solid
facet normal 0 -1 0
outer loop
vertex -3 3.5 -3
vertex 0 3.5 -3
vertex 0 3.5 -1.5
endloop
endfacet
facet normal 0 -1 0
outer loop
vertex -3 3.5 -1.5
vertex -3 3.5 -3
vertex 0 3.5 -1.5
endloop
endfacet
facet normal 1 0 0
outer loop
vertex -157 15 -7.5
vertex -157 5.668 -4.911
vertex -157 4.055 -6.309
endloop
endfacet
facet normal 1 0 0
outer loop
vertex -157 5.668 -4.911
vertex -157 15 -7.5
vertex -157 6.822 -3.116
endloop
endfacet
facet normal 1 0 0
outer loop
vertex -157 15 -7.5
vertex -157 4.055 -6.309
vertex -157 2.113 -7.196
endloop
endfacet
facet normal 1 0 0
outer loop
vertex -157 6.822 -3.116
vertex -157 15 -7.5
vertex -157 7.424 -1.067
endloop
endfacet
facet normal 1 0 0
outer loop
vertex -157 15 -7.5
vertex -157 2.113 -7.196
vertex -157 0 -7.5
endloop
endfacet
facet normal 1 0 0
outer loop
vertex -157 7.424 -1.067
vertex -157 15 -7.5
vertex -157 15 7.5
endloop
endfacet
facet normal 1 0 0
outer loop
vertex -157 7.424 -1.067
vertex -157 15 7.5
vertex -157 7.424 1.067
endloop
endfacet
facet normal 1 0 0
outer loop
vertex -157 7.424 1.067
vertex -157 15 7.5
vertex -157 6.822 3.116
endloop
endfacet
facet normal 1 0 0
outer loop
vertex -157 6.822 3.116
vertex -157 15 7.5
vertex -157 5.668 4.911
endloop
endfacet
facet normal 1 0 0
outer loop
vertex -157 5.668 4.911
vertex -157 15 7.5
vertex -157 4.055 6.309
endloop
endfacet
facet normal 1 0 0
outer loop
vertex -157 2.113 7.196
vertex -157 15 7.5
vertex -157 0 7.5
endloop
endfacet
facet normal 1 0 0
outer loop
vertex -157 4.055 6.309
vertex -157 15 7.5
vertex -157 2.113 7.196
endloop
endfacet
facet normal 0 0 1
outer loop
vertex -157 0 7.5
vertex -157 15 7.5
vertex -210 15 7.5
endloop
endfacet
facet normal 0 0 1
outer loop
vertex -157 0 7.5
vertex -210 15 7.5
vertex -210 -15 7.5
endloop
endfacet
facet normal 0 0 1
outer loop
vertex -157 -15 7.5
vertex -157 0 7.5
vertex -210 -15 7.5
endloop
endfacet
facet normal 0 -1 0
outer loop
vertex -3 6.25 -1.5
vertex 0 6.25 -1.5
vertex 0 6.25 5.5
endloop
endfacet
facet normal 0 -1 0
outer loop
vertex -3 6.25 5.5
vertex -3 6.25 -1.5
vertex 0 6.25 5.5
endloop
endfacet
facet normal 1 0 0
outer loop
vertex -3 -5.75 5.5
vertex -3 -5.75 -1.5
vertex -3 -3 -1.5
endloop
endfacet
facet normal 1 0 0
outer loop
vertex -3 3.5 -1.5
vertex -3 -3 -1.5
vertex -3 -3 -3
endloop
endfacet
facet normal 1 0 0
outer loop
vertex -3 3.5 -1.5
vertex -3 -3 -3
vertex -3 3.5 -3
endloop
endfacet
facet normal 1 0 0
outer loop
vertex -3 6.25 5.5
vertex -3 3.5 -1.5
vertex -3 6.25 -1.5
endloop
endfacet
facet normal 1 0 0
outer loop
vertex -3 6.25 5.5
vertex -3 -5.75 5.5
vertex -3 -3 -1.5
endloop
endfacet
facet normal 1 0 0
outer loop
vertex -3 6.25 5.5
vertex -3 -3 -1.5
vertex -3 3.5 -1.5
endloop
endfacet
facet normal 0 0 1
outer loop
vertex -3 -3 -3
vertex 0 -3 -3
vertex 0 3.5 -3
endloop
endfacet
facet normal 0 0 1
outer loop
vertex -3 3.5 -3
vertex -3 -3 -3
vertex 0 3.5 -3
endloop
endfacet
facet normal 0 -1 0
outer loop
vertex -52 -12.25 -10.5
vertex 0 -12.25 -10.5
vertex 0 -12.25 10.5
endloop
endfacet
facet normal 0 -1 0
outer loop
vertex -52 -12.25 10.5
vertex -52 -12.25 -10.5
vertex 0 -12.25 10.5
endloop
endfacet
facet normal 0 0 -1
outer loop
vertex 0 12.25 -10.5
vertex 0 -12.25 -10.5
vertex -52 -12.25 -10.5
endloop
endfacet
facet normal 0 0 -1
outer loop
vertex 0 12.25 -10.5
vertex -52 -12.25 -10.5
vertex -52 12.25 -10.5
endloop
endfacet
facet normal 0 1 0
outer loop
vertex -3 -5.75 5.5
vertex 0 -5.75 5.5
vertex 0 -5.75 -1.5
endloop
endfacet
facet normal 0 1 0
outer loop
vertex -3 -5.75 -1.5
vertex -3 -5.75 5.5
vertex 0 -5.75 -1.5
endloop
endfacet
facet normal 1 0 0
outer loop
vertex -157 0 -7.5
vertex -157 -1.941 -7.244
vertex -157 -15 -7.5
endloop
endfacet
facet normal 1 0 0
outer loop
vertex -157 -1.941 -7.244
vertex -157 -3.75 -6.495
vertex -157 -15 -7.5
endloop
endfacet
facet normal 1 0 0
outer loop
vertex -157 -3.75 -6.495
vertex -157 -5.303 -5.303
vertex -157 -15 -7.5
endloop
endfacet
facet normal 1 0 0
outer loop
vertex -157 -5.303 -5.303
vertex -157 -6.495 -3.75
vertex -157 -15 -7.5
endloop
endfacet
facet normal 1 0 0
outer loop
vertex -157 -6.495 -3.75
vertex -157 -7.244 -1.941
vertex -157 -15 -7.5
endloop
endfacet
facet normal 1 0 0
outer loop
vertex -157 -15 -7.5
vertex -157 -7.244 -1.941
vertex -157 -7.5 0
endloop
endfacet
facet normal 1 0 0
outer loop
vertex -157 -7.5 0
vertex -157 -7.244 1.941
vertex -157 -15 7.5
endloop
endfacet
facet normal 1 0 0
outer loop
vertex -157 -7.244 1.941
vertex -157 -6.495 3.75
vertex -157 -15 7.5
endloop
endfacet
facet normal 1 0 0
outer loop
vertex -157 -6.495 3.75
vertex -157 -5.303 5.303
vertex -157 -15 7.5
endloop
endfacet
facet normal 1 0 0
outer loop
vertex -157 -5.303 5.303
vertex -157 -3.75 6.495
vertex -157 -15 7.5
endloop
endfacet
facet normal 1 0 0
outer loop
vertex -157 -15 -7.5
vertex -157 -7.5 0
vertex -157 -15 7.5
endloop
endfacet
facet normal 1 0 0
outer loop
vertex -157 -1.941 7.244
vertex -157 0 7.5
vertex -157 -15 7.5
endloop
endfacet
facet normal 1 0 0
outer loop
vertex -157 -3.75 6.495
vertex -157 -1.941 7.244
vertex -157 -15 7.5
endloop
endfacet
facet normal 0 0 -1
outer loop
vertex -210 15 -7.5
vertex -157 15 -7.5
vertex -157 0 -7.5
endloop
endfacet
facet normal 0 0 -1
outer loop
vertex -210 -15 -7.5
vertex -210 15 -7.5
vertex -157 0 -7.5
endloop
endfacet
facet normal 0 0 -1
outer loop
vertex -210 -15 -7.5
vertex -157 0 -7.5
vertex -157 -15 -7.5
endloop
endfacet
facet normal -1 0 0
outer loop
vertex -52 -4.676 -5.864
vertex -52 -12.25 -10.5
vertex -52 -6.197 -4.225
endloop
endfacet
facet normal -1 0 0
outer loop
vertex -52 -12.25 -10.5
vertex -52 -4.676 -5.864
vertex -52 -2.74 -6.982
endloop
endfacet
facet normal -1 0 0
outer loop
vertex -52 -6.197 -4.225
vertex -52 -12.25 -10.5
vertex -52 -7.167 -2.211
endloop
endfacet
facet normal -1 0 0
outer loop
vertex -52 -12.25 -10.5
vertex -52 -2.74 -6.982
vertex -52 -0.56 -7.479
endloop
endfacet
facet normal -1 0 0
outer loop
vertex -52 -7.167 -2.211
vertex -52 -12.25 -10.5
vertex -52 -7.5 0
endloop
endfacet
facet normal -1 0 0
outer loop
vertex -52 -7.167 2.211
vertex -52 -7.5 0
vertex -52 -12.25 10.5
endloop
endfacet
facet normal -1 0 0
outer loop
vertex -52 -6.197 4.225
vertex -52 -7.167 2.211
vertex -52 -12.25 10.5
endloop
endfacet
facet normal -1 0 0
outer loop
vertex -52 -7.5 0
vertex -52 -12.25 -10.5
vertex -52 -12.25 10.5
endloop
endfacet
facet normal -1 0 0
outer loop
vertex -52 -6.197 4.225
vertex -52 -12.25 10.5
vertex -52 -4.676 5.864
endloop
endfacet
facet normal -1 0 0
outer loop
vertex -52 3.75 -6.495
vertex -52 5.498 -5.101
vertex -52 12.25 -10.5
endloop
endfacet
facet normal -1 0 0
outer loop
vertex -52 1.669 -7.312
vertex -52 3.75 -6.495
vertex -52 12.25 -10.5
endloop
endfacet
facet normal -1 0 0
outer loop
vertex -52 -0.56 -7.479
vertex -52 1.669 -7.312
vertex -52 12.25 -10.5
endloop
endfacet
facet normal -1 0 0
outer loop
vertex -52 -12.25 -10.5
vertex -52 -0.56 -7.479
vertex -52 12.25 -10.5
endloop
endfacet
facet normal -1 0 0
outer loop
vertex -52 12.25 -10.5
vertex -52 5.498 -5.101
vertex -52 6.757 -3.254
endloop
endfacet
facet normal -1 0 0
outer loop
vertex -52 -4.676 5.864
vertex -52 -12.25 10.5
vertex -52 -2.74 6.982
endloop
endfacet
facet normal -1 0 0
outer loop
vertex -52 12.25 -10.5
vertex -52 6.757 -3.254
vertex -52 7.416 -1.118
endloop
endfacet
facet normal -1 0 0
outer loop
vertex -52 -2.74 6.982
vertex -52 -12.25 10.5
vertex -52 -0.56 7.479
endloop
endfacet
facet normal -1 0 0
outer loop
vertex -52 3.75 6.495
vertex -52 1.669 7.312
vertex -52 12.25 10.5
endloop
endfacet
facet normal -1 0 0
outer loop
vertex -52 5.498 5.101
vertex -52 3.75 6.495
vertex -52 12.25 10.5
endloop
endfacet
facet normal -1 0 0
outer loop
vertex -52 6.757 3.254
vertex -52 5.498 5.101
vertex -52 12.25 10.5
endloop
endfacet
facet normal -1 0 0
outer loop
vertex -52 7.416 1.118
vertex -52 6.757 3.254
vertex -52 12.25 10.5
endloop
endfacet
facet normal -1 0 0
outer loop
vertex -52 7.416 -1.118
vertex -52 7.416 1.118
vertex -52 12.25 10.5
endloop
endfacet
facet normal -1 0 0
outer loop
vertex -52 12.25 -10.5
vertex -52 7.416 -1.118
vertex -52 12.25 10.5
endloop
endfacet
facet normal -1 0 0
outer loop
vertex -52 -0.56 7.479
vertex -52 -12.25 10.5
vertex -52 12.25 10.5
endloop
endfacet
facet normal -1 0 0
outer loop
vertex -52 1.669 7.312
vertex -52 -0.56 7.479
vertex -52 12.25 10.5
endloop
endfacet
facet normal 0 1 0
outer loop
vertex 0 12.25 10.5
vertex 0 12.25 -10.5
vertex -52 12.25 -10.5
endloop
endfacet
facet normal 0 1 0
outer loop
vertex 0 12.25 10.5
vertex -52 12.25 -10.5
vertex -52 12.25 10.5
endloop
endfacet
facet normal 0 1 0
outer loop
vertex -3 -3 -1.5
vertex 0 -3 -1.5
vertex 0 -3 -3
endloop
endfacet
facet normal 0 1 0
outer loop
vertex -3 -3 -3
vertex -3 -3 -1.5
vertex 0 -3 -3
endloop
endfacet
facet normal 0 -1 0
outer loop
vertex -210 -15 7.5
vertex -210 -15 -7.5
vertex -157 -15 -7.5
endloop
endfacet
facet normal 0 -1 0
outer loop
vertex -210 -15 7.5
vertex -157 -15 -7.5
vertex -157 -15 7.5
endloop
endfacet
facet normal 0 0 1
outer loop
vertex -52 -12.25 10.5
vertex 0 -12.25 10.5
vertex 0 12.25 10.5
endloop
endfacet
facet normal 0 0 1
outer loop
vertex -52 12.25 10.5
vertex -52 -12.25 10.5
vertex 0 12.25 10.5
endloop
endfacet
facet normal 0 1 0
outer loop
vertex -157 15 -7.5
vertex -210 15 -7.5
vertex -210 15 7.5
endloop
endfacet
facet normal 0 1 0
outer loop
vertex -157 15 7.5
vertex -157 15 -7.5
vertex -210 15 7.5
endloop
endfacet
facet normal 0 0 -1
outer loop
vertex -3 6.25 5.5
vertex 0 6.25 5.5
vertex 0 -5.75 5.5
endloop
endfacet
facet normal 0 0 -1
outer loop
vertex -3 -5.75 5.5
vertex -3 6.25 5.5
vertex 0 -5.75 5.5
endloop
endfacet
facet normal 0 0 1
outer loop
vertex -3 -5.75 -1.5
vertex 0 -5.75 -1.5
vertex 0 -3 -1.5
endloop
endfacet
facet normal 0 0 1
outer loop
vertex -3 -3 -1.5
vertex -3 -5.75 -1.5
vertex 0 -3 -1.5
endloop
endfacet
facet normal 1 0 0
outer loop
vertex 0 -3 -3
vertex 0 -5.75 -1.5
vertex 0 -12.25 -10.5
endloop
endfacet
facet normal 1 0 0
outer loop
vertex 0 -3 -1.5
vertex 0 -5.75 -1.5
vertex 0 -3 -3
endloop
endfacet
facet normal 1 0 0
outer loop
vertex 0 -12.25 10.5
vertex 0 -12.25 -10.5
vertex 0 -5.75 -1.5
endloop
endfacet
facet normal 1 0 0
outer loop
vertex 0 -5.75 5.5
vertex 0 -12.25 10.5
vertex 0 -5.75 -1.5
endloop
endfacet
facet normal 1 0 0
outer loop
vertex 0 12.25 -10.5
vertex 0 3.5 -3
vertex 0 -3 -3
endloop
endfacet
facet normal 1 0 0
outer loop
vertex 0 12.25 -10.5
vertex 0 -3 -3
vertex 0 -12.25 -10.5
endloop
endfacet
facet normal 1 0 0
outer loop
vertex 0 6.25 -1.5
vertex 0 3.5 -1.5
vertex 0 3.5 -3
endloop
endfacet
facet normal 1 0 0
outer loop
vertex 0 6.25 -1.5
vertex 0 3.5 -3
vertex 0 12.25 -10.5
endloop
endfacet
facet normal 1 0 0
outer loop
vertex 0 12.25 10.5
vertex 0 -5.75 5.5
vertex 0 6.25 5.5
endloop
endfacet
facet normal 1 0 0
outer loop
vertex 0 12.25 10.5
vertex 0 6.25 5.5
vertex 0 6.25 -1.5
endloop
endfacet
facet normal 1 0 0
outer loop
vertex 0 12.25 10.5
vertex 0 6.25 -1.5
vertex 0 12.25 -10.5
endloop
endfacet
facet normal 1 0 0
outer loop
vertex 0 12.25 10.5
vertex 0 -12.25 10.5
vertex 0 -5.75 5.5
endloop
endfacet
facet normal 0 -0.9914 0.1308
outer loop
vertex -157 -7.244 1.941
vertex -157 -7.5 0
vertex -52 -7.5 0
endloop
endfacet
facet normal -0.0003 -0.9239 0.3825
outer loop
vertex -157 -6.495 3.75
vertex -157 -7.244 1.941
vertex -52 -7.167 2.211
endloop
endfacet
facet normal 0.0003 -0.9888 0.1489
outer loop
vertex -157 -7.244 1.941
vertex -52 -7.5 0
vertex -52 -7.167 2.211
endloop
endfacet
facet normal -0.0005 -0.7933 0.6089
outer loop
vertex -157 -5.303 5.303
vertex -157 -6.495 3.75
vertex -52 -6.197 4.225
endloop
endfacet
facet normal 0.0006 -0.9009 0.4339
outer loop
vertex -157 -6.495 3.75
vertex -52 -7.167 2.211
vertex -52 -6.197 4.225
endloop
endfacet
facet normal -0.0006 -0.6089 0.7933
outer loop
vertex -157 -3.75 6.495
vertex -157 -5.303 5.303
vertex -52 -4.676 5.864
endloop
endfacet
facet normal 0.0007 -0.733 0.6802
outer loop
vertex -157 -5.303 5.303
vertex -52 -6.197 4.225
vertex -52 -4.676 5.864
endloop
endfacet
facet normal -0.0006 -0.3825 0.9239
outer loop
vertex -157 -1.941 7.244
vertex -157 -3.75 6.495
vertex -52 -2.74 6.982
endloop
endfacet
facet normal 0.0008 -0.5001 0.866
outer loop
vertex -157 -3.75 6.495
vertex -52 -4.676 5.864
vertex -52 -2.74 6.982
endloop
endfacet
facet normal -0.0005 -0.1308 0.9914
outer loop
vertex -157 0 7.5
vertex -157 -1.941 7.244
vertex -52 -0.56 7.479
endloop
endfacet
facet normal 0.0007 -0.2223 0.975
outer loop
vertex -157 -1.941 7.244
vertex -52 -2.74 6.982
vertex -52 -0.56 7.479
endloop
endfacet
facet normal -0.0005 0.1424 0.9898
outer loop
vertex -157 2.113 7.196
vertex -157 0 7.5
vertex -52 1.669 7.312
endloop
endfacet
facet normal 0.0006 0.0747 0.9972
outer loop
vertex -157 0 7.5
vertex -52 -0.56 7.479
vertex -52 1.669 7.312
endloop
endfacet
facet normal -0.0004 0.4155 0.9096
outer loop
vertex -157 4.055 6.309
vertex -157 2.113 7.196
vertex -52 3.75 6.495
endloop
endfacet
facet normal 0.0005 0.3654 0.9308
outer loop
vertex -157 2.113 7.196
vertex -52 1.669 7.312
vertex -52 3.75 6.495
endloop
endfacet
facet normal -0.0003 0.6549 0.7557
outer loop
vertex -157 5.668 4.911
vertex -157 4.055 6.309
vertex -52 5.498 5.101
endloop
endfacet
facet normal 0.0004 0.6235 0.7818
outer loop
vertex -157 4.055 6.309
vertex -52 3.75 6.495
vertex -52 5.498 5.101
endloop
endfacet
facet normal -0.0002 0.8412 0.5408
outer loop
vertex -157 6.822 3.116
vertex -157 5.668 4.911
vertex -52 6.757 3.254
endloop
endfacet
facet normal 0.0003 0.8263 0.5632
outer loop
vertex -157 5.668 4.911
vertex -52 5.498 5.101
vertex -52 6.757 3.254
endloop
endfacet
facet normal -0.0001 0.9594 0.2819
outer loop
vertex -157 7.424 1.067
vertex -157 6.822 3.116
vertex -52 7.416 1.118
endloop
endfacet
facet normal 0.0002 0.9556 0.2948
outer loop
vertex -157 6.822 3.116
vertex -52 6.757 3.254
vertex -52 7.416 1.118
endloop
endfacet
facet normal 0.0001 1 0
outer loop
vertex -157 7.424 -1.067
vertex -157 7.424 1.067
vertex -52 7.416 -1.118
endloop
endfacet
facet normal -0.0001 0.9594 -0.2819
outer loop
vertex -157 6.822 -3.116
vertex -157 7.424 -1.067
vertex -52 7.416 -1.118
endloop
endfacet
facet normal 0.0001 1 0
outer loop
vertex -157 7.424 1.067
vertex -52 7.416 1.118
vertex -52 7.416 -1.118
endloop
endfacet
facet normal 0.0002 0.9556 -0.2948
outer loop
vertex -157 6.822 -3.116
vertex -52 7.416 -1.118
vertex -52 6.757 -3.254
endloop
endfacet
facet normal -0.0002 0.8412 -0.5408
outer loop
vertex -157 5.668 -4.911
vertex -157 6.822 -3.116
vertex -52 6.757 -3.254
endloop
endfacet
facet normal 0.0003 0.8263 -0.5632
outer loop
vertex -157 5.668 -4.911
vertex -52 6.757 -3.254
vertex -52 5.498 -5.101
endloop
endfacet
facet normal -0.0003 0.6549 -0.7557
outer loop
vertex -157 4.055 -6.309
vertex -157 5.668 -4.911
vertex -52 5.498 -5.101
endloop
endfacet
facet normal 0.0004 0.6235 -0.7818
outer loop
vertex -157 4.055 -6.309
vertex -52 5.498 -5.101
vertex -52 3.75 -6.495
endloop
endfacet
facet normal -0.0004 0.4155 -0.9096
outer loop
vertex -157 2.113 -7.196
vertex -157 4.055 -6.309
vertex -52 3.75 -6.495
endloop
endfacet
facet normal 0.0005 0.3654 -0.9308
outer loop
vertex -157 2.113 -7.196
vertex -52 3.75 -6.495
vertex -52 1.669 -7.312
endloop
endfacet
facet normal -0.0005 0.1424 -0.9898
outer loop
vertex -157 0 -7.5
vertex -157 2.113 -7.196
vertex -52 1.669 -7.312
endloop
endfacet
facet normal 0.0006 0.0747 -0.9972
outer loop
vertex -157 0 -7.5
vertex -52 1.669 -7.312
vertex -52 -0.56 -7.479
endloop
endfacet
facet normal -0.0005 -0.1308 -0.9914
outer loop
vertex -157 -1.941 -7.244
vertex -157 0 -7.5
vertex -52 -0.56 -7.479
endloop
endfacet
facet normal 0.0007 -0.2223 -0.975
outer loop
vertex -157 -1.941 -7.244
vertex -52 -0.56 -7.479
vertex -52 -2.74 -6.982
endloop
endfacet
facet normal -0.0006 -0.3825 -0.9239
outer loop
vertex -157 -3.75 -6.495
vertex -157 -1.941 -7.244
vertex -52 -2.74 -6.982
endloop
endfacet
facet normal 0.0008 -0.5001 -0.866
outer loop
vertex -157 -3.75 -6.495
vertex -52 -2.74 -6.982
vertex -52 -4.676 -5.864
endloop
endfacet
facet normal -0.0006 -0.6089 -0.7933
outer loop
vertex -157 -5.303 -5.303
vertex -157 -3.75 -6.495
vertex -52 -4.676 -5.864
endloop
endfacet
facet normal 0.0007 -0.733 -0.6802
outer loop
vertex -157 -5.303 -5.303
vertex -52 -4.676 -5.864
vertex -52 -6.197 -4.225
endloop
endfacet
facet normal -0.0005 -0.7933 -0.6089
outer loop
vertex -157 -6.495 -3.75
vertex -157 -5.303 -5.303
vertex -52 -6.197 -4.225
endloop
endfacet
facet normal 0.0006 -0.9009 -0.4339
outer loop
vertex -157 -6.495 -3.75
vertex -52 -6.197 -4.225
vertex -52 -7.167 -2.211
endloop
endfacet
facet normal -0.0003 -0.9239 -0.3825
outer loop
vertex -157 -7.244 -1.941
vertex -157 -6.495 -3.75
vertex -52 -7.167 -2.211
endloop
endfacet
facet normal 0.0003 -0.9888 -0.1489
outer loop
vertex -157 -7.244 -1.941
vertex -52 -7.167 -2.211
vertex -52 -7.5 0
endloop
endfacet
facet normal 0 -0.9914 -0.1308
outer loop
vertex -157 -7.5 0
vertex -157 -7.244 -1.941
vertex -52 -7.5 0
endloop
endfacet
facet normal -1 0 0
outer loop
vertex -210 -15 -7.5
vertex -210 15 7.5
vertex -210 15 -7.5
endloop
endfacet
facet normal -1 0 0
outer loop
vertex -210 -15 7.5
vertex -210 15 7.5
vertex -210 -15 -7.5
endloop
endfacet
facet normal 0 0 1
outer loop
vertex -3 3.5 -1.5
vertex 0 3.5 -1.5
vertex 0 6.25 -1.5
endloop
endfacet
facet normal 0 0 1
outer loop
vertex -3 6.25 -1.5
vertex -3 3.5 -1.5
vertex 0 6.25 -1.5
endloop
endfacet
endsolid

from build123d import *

# Parameters (mm, degrees)
F0_W     = 24.5
F0_H     = 21
F1_DEPTH = 52
F2_R     = 7.5
F3_DEPTH = 105
F4_W     = 30
F4_H     = 15
F5_DEPTH = 53
F6_DEPTH = 3


with BuildPart() as f1:
    # F0 (on Right) → F1 (new body)
    with BuildSketch(Plane.YZ):
        Rectangle(F0_W, F0_H)
        Polygon((-3, -1.5), (-5.75, -1.5), (-5.75, 5.5), (6.25, 5.5), (6.25, -1.5), (3.5, -1.5), (3.5, -3), (-3, -3), align=None, mode=Mode.SUBTRACT)
        Polygon((-5.75, 5.5), (-5.75, -1.5), (-3, -1.5), (-3, -3), (3.5, -3), (3.5, -1.5), (6.25, -1.5), (6.25, 5.5), align=None)
    extrude(amount=-F1_DEPTH)

    # F2 (on face) → F3 (join)
    with BuildSketch(Plane(origin=(-52, 0, 0), x_dir=(0, -1, 0), z_dir=(-1, 0, 0))):
        Circle(F2_R)
    extrude(amount=F3_DEPTH)

    # F4 (on face) → F5 (join)
    with BuildSketch(Plane(origin=(-157, 0, 0), x_dir=(0, -1, 0), z_dir=(-1, 0, 0))):
        Rectangle(F4_W, F4_H)
    extrude(amount=F5_DEPTH)

    # F0 (on Right) → F6 (cut)
    with BuildSketch(Plane.YZ):
        Polygon((-5.75, 5.5), (-5.75, -1.5), (-3, -1.5), (-3, -3), (3.5, -3), (3.5, -1.5), (6.25, -1.5), (6.25, 5.5), align=None)
    extrude(amount=-F6_DEPTH, mode=Mode.SUBTRACT)


solid = f1.part
